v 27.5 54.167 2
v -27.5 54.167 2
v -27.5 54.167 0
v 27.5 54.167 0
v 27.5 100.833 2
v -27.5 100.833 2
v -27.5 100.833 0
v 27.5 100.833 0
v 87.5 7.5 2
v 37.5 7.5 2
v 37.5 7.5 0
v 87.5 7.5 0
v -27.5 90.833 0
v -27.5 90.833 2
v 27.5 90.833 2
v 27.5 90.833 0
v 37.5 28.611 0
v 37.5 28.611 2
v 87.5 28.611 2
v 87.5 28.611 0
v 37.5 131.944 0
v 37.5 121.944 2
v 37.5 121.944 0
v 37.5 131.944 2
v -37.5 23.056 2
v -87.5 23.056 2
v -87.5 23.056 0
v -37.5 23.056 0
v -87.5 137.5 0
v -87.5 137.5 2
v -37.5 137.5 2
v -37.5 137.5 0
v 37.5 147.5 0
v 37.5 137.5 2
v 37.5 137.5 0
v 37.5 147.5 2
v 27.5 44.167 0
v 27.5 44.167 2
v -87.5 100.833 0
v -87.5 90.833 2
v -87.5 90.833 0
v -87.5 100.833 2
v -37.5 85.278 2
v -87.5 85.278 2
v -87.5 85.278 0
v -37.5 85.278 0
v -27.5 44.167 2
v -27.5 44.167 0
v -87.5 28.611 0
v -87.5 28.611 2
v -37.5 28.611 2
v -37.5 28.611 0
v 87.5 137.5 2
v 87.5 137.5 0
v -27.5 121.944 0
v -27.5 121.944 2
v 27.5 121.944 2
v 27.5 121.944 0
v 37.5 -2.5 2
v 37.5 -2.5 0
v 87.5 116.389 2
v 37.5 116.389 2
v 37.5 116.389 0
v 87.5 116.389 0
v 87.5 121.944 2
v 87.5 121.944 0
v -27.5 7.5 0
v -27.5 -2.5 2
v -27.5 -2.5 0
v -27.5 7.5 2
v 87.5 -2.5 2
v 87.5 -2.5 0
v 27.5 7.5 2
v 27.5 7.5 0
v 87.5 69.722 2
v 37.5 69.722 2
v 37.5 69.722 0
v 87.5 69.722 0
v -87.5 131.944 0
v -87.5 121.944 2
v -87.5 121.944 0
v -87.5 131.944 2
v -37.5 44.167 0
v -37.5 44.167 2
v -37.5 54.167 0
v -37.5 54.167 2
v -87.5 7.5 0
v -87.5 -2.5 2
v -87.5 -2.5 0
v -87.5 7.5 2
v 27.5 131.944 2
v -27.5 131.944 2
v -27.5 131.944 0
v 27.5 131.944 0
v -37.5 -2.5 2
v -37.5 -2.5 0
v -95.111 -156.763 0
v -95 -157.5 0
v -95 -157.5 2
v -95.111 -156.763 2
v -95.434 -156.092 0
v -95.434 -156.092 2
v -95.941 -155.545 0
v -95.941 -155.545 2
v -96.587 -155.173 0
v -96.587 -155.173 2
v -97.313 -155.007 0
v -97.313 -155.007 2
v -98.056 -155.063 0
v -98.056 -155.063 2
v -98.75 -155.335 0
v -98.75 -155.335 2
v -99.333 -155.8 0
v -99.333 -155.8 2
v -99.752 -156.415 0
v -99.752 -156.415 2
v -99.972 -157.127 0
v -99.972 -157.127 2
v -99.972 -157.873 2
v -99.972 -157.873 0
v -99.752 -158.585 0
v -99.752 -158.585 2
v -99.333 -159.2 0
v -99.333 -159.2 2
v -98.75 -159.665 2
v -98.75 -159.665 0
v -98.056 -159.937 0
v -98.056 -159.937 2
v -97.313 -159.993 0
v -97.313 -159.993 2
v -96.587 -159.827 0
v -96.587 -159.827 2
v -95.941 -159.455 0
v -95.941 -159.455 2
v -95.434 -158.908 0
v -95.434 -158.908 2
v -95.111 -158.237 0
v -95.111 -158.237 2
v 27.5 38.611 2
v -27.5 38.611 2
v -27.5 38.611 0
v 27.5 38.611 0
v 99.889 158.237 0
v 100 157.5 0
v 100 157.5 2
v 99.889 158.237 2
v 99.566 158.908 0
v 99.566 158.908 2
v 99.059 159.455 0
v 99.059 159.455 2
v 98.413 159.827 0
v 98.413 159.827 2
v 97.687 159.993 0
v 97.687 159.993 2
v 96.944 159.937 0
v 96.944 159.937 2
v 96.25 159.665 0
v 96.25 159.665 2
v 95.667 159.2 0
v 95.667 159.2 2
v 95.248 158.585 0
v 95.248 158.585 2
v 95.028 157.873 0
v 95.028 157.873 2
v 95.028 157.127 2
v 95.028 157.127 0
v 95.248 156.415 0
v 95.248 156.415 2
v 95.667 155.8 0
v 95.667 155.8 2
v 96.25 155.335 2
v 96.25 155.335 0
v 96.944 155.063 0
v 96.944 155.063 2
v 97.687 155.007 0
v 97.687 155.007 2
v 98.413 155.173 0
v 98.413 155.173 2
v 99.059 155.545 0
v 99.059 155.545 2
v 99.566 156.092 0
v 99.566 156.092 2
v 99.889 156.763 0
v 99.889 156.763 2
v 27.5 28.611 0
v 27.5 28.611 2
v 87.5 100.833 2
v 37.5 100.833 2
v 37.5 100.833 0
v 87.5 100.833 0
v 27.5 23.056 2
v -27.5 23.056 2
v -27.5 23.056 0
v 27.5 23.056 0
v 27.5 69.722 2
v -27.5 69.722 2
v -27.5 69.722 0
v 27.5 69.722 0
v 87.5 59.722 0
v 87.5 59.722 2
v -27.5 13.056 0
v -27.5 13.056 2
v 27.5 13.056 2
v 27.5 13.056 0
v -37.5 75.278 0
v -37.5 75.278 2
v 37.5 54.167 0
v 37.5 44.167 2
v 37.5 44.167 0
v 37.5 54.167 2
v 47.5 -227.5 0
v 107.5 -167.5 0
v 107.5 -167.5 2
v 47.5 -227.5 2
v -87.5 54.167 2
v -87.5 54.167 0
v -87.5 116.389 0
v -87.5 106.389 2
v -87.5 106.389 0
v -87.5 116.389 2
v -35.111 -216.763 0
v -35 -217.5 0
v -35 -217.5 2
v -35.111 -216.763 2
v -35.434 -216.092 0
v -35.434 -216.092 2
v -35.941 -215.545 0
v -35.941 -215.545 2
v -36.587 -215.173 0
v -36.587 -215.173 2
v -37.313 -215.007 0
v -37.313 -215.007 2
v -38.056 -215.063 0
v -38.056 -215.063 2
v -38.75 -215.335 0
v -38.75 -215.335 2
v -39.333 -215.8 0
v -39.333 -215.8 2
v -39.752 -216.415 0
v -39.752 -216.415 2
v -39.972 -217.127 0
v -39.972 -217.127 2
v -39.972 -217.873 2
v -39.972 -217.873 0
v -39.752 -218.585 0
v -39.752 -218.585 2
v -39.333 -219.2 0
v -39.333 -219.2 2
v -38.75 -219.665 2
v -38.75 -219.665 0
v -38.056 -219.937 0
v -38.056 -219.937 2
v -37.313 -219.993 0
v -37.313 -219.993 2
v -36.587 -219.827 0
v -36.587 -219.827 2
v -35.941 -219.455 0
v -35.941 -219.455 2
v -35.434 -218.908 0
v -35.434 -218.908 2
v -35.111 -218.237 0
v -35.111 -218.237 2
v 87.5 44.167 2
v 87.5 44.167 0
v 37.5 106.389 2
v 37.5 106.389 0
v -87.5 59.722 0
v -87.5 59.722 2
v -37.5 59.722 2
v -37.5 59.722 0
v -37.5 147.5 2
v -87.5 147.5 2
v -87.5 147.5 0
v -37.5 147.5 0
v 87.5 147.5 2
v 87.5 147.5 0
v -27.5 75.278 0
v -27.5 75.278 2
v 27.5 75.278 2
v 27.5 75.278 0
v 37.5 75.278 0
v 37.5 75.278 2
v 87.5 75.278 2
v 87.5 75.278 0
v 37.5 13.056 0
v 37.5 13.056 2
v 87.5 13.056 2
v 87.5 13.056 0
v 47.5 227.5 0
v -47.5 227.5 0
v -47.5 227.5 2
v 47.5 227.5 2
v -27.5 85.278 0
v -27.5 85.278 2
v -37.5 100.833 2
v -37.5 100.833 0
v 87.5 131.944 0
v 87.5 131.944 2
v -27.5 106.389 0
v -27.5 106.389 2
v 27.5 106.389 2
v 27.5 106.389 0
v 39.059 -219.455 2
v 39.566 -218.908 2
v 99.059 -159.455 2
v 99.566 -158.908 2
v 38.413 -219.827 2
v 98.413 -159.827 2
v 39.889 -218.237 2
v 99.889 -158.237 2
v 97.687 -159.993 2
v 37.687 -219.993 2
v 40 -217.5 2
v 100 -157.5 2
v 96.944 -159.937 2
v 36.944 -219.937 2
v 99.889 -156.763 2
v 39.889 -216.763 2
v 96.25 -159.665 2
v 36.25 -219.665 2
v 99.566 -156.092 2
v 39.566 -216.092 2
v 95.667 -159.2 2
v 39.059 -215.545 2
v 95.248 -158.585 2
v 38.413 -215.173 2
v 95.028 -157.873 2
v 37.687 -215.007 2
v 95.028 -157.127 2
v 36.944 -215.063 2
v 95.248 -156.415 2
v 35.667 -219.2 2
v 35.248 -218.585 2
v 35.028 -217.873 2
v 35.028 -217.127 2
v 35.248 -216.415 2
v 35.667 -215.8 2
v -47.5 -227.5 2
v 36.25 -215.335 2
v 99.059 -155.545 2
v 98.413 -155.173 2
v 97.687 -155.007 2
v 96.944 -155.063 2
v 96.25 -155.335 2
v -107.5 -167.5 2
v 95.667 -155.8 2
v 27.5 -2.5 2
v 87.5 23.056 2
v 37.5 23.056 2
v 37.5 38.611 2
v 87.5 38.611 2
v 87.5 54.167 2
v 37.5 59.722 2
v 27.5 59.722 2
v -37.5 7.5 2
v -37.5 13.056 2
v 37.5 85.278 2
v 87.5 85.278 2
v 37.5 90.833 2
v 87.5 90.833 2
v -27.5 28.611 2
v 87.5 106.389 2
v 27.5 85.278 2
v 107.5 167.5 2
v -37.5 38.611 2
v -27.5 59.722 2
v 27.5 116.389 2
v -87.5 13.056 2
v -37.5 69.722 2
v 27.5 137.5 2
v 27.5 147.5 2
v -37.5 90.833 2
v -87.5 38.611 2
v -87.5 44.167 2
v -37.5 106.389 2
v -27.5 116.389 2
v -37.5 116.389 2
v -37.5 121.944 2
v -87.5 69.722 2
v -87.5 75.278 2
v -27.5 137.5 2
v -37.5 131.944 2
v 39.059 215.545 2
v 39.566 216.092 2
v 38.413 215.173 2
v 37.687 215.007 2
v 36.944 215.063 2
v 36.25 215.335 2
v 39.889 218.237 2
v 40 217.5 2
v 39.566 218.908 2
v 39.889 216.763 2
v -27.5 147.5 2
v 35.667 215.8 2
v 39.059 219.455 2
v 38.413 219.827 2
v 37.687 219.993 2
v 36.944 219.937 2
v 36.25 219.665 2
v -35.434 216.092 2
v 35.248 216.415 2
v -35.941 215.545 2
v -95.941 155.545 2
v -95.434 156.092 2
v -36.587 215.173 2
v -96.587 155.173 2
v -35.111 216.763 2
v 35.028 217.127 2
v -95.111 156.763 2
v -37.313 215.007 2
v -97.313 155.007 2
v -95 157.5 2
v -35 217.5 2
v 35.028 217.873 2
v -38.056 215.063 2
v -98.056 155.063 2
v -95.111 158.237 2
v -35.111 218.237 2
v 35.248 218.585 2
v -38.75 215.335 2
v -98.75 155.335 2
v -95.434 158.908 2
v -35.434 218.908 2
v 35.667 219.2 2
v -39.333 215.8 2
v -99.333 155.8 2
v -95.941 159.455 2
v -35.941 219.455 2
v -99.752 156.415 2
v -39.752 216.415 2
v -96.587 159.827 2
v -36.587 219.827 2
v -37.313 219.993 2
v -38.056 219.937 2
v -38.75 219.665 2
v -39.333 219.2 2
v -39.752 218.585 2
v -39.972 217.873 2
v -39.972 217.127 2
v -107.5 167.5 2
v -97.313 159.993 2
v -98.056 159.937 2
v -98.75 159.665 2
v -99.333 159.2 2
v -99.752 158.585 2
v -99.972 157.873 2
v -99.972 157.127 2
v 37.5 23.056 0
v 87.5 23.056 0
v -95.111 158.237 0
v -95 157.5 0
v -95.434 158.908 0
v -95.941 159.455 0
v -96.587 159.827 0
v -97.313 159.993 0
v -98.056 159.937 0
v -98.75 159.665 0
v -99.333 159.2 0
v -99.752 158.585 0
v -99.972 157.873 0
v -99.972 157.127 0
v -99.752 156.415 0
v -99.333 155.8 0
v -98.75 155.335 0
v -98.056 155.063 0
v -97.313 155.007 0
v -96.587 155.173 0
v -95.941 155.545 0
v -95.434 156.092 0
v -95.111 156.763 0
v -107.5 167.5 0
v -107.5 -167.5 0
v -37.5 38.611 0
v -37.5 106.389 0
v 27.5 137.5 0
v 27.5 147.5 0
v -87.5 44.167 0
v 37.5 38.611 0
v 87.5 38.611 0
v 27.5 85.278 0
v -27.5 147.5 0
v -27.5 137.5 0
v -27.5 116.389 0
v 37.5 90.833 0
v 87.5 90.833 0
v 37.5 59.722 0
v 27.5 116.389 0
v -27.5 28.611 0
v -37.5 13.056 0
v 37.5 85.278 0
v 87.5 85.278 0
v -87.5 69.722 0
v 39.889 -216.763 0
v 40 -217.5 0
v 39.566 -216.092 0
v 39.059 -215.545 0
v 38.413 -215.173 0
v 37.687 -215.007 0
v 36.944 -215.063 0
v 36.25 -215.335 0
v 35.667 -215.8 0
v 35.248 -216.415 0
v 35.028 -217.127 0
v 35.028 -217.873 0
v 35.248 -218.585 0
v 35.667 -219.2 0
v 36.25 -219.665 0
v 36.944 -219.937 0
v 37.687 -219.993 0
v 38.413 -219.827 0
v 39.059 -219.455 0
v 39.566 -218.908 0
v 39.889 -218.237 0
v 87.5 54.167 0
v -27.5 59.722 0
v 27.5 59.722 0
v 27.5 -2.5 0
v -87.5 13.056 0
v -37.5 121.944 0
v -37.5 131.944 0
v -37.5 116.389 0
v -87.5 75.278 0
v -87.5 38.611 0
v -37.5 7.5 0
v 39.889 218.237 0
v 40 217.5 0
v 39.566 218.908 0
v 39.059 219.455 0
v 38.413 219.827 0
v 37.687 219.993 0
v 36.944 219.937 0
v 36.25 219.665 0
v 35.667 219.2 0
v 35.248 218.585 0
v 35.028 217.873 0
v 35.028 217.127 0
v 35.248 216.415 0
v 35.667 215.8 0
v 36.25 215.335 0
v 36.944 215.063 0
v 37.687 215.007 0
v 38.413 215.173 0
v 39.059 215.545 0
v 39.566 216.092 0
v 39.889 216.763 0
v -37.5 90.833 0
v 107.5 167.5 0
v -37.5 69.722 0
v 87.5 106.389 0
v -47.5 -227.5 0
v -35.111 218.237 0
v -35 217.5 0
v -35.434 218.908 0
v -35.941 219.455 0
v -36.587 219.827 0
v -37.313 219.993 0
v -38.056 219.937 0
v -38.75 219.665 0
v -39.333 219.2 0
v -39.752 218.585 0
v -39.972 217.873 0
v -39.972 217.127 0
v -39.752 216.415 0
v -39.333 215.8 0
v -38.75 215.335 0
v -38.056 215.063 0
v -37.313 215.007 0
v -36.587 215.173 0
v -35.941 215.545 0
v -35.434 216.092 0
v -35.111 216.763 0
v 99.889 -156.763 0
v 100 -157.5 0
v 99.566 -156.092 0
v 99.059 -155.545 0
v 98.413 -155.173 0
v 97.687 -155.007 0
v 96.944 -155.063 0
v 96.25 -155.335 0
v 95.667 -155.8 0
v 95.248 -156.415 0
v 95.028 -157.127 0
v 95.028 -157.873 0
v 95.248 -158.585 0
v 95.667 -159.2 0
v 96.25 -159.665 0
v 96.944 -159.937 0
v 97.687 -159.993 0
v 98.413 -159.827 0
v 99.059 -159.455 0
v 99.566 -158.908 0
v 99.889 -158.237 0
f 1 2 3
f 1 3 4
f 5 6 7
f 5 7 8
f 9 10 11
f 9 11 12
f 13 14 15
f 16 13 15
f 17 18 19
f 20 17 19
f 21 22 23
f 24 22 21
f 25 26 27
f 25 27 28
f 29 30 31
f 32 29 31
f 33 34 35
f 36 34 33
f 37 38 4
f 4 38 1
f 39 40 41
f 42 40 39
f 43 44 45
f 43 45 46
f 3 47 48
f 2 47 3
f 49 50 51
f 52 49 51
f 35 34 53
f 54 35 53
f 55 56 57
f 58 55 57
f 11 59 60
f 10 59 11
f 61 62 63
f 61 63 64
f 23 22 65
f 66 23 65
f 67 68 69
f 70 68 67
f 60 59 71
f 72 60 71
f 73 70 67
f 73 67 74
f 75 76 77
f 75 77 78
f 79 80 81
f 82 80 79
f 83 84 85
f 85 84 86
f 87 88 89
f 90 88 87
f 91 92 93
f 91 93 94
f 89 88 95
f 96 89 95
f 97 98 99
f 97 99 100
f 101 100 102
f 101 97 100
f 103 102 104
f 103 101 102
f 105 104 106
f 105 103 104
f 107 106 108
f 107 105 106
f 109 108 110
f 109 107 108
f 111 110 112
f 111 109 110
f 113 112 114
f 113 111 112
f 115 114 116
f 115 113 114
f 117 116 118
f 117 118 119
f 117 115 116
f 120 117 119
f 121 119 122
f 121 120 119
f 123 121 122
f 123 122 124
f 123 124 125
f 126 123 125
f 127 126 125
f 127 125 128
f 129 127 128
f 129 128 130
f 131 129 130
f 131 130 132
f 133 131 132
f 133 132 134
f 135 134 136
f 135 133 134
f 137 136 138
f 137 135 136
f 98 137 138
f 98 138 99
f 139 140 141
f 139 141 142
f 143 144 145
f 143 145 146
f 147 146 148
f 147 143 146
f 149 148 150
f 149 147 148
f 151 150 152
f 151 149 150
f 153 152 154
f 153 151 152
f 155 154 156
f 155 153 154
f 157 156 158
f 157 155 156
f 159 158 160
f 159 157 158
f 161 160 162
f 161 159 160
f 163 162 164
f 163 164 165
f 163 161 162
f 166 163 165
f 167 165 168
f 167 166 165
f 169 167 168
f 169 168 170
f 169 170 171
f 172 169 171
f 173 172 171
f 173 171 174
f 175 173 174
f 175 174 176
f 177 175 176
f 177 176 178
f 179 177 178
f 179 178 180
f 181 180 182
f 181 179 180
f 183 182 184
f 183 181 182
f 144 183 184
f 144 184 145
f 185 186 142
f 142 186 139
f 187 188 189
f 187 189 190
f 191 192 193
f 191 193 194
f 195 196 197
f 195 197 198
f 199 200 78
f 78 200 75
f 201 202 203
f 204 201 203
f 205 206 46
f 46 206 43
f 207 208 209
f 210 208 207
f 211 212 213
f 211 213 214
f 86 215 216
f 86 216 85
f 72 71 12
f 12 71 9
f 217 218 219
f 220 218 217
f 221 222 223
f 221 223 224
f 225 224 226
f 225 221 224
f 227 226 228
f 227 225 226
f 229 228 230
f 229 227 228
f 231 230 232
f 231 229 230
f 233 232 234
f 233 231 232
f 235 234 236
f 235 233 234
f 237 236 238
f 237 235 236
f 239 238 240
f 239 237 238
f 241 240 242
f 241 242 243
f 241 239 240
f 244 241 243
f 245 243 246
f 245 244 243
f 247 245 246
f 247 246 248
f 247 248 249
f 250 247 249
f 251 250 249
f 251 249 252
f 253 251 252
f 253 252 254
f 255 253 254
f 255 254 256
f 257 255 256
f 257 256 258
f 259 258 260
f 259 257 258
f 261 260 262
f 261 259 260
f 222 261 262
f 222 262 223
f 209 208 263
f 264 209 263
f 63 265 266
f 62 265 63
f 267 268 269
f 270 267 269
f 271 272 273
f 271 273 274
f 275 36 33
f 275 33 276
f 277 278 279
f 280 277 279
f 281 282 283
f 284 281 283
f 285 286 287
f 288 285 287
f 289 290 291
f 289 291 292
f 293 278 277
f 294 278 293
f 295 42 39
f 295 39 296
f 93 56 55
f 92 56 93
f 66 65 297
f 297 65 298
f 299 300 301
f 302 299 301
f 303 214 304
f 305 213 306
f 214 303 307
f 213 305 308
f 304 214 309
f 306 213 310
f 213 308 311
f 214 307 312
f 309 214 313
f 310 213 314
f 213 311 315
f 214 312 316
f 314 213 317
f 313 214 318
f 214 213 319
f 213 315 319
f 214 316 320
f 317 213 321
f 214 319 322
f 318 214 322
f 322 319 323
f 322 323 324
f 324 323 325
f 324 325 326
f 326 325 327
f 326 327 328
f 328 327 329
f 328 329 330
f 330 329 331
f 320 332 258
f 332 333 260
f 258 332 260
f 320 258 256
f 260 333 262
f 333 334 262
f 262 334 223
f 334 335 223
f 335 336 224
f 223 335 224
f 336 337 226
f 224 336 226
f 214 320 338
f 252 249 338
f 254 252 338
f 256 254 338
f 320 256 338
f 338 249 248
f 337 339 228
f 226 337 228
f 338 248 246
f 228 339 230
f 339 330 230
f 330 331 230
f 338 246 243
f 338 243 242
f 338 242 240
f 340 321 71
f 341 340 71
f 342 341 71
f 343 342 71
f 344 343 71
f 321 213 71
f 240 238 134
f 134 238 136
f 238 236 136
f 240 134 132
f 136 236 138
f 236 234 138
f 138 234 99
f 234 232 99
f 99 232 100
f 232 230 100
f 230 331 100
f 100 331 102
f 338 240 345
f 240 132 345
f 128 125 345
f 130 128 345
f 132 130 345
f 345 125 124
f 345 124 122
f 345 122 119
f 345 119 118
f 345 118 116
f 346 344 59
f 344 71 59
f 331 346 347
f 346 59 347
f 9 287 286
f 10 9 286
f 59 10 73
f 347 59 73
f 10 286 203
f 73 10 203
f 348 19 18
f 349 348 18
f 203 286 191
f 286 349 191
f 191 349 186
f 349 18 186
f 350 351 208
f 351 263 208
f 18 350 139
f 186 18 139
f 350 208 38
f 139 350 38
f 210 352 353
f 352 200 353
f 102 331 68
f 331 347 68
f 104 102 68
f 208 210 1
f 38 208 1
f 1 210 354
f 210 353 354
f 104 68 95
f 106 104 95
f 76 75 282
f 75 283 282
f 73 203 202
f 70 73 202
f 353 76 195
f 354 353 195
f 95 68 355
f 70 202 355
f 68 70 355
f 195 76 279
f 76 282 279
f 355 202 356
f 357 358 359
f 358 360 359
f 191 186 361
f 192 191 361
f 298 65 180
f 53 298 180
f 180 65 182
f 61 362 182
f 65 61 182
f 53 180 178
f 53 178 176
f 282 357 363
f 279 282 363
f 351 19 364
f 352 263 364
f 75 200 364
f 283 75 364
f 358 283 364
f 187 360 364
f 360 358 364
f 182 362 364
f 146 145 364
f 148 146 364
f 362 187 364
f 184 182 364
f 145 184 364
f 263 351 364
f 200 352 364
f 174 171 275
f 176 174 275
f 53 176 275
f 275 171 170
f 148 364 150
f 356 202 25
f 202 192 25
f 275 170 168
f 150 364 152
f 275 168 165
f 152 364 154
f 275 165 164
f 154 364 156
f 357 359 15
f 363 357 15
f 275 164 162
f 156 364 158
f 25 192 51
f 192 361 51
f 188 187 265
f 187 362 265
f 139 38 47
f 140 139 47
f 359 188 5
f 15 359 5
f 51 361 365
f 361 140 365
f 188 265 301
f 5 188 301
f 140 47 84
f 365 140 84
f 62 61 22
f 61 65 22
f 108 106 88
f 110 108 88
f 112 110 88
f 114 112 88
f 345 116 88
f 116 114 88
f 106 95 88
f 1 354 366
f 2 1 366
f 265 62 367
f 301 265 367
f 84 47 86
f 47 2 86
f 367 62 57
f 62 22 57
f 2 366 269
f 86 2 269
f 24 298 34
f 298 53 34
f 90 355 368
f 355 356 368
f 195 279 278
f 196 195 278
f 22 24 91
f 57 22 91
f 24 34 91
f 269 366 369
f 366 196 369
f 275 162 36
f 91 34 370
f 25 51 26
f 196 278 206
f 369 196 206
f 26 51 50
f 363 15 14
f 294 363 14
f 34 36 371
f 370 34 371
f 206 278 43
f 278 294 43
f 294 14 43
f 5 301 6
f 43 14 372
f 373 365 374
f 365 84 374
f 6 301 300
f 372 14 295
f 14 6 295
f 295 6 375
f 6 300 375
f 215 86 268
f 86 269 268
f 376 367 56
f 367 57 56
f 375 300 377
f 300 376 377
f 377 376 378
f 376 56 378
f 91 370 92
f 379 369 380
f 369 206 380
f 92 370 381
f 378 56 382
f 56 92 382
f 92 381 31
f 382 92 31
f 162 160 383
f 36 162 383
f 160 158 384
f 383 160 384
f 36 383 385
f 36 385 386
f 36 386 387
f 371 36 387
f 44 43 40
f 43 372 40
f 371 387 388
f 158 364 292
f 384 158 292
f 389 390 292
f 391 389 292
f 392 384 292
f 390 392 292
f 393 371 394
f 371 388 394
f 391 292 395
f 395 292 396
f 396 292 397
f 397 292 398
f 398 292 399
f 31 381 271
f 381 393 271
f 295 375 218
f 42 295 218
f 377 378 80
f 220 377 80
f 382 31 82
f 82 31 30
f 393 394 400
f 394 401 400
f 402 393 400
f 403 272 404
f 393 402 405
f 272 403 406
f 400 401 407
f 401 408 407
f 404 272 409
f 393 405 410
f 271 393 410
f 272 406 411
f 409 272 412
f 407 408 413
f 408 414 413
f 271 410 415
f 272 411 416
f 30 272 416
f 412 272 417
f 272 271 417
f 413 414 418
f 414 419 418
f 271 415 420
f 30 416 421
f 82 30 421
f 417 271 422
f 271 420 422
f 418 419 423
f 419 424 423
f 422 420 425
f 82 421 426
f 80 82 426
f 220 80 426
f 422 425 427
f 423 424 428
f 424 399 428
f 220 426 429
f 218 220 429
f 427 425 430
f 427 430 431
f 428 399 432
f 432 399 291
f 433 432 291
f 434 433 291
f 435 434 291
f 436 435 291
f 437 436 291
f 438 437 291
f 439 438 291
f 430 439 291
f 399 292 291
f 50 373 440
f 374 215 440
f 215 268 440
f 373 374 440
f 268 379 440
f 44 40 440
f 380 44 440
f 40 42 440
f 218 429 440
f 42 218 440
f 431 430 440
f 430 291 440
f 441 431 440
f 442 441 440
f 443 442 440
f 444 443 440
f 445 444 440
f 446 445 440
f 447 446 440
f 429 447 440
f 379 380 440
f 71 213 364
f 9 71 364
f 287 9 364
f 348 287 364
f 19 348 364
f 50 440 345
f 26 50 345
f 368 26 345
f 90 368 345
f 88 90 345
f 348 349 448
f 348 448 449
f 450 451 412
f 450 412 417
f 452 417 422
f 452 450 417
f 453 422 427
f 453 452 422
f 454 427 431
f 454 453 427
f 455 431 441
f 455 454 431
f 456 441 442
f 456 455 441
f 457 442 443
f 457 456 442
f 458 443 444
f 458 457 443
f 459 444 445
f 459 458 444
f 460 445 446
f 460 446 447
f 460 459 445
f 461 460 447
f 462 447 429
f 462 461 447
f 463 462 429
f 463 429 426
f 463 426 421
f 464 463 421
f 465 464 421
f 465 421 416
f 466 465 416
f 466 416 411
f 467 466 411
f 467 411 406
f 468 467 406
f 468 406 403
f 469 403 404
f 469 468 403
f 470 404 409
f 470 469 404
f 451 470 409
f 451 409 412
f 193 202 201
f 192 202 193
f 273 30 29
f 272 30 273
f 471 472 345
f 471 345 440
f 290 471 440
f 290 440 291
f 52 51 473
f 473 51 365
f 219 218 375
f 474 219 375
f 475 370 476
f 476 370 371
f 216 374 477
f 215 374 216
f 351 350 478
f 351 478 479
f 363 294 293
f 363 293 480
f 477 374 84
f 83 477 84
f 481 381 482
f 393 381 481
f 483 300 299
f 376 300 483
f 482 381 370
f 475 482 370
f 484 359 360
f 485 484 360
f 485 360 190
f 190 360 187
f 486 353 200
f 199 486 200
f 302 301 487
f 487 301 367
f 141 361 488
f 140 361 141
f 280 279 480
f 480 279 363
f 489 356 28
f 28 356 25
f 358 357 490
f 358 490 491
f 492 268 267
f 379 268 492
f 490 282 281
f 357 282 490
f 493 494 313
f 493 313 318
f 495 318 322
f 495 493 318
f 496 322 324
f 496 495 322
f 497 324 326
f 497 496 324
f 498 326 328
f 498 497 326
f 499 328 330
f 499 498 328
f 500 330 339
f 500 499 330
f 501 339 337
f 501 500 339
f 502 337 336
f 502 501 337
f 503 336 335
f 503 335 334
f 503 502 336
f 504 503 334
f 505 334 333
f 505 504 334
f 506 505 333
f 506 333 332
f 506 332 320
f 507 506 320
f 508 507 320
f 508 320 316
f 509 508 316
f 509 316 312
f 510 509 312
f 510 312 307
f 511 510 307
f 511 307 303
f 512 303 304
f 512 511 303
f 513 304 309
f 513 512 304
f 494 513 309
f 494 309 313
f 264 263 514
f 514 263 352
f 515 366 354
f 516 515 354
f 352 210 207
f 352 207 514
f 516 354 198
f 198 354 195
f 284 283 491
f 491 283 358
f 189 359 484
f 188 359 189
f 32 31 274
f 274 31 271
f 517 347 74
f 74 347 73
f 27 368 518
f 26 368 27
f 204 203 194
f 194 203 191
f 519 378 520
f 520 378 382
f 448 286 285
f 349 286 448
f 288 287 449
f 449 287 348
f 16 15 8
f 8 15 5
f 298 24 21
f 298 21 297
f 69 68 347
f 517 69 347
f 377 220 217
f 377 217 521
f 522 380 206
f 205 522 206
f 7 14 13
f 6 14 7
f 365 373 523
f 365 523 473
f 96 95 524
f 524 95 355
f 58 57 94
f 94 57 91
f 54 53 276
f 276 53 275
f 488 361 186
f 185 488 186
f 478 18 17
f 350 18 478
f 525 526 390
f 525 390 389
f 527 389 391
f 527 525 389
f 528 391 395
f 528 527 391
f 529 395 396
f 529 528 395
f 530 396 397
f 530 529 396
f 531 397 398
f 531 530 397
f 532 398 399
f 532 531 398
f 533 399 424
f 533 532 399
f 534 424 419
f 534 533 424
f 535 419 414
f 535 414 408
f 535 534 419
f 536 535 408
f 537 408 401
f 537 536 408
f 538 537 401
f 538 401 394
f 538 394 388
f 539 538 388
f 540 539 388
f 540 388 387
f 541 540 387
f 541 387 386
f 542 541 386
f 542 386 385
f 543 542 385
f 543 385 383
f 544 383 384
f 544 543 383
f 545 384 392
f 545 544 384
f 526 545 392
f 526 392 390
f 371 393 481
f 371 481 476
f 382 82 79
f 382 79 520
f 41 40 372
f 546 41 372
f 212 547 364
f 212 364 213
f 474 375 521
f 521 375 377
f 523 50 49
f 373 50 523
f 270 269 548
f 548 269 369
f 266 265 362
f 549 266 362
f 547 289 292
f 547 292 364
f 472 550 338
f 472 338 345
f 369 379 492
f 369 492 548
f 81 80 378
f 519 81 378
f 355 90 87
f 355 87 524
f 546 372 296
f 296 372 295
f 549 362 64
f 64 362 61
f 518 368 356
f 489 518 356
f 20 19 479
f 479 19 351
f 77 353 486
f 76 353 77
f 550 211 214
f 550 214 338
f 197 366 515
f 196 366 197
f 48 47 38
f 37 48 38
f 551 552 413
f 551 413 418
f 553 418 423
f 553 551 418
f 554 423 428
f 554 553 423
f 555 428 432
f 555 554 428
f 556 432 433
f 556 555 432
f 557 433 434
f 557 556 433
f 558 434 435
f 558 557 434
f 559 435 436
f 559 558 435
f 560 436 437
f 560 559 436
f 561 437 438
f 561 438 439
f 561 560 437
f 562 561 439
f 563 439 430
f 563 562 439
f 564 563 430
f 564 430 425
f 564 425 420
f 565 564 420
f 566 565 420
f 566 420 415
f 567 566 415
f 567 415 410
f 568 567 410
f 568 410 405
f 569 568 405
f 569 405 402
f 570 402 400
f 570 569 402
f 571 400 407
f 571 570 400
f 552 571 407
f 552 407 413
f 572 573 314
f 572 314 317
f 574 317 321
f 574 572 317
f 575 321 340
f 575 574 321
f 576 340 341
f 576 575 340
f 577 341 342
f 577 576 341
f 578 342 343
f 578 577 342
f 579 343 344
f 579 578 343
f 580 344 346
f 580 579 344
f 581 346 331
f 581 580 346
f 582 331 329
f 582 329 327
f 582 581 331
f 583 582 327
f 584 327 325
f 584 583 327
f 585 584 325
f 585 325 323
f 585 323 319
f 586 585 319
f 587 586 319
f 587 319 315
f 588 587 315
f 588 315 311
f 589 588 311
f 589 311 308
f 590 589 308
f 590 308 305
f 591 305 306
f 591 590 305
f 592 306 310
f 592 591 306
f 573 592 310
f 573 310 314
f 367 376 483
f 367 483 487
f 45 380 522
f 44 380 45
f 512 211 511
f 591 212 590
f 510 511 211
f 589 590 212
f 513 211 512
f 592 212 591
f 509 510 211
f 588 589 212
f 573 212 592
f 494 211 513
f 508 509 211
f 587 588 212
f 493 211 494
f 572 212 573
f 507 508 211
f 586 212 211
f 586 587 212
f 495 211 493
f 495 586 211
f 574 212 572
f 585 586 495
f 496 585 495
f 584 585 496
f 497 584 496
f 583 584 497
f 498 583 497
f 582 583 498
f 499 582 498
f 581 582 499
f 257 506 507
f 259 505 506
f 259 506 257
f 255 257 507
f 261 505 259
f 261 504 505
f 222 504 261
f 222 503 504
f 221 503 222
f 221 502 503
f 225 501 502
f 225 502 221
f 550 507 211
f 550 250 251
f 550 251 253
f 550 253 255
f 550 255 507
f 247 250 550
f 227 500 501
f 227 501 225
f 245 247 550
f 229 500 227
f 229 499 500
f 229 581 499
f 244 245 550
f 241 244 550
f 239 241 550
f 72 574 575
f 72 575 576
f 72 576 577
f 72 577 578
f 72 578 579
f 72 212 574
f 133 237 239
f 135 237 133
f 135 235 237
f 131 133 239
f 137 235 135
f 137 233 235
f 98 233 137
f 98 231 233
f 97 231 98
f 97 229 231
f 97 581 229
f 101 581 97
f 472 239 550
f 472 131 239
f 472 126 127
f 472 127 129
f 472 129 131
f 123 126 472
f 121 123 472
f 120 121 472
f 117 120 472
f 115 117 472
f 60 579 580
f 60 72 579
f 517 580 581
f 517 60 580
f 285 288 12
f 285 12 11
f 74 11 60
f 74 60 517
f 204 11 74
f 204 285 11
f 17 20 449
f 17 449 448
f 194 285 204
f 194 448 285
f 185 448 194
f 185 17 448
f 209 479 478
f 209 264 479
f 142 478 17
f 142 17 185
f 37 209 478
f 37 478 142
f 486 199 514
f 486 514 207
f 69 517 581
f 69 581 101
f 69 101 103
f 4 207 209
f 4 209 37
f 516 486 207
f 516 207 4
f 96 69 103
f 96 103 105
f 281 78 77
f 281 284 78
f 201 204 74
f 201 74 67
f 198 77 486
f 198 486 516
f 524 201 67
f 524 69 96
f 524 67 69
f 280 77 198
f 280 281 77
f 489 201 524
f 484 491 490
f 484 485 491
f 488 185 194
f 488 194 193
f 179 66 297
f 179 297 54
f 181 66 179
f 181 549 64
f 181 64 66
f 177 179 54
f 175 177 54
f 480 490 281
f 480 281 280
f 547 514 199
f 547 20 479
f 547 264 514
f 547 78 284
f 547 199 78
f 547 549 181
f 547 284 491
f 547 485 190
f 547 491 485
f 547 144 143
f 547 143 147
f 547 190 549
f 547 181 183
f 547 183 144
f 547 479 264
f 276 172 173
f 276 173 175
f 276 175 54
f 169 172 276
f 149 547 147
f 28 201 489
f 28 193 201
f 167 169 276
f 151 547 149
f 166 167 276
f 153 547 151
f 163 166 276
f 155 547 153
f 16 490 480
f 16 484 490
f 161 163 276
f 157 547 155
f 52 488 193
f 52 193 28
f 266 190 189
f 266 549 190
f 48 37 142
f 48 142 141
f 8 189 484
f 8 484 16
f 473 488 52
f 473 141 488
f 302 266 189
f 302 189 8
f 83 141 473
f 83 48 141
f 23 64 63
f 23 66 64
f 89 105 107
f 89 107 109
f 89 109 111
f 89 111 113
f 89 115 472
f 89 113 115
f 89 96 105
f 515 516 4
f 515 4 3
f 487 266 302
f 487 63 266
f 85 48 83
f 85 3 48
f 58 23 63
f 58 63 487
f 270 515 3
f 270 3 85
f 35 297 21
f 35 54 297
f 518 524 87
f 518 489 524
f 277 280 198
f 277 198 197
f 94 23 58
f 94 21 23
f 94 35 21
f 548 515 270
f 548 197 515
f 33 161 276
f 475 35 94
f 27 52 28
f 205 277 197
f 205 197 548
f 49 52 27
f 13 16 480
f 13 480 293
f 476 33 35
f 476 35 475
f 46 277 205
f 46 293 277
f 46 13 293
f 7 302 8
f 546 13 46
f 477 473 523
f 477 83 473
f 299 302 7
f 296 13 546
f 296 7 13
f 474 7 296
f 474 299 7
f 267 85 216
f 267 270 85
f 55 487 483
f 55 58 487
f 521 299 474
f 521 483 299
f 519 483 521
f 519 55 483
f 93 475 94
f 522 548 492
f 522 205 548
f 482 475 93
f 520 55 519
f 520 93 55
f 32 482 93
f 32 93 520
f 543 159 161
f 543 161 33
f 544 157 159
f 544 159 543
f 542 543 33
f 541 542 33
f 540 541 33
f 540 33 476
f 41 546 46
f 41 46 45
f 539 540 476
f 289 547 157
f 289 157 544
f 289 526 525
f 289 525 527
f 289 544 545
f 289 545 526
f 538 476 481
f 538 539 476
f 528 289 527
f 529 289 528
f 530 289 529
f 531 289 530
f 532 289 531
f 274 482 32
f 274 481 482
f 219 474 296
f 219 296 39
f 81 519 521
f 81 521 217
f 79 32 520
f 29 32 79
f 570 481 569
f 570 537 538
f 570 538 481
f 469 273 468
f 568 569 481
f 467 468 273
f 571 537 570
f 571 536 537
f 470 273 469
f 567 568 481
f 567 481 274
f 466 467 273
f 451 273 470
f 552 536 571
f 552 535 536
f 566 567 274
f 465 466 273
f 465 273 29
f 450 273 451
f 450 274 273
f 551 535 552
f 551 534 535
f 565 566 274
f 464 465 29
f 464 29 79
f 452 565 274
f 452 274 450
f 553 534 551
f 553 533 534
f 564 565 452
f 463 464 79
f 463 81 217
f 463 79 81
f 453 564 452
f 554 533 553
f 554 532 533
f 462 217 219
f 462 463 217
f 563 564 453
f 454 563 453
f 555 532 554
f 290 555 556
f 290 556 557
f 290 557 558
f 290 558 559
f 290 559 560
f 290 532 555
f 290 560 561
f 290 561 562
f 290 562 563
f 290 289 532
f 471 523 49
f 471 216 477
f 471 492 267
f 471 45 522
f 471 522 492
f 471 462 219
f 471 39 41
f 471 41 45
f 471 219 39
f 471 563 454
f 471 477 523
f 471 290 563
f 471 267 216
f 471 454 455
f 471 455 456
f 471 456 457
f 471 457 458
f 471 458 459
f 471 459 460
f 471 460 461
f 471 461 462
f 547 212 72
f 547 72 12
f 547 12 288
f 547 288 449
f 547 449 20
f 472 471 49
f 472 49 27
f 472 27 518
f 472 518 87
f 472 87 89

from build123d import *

# Parameters (mm, degrees)
SKETCH_R            = 2.5
PAD_DEPTH           = 2
SKETCH001_W         = 50
SKETCH001_H         = 10
SKETCH001_W_2       = 55
POCKET_DEPTH        = 5
LINEARPATTERN_COUNT = 10
LINEARPATTERN_PITCH = 15.555556


with BuildPart() as part:
    # Sketch → Pad (new body)
    with BuildSketch(Plane.XY):
        Polygon((-47.5, 227.5), (47.5, 227.5), (107.5, 167.5), (107.5, -167.5), (47.5, -227.5), (-47.5, -227.5), (-107.5, -167.5), (-107.5, 167.5), align=None)
        with Locations((-97.5, 157.5)):
            Circle(SKETCH_R, mode=Mode.SUBTRACT)
        with Locations((-37.5, 217.5)):
            Circle(SKETCH_R, mode=Mode.SUBTRACT)
        with Locations((37.5, 217.5)):
            Circle(SKETCH_R, mode=Mode.SUBTRACT)
        with Locations((97.5, 157.5)):
            Circle(SKETCH_R, mode=Mode.SUBTRACT)
        with Locations((97.5, -157.5)):
            Circle(SKETCH_R, mode=Mode.SUBTRACT)
        with Locations((37.5, -217.5)):
            Circle(SKETCH_R, mode=Mode.SUBTRACT)
        with Locations((-37.5, -217.5)):
            Circle(SKETCH_R, mode=Mode.SUBTRACT)
        with Locations((-97.5, -157.5)):
            Circle(SKETCH_R, mode=Mode.SUBTRACT)
    extrude(amount=PAD_DEPTH)

    # Sketch001 → Pocket (cut)
    with BuildSketch(Plane.XY.offset(2)):
        with Locations((-62.5, 142.5)):
            Rectangle(SKETCH001_W, SKETCH001_H)
        with Locations((62.5, 142.5)):
            Rectangle(SKETCH001_W, SKETCH001_H)
        with Locations((0, 142.5)):
            Rectangle(SKETCH001_W_2, SKETCH001_H)
    pocket = extrude(amount=-POCKET_DEPTH, mode=Mode.SUBTRACT)

    # LinearPattern: Pocket ×10
    with Locations(*[(0, -i * LINEARPATTERN_PITCH, 0) for i in range(1, LINEARPATTERN_COUNT)]):
        add(pocket, mode=Mode.SUBTRACT)


solid = part.part
